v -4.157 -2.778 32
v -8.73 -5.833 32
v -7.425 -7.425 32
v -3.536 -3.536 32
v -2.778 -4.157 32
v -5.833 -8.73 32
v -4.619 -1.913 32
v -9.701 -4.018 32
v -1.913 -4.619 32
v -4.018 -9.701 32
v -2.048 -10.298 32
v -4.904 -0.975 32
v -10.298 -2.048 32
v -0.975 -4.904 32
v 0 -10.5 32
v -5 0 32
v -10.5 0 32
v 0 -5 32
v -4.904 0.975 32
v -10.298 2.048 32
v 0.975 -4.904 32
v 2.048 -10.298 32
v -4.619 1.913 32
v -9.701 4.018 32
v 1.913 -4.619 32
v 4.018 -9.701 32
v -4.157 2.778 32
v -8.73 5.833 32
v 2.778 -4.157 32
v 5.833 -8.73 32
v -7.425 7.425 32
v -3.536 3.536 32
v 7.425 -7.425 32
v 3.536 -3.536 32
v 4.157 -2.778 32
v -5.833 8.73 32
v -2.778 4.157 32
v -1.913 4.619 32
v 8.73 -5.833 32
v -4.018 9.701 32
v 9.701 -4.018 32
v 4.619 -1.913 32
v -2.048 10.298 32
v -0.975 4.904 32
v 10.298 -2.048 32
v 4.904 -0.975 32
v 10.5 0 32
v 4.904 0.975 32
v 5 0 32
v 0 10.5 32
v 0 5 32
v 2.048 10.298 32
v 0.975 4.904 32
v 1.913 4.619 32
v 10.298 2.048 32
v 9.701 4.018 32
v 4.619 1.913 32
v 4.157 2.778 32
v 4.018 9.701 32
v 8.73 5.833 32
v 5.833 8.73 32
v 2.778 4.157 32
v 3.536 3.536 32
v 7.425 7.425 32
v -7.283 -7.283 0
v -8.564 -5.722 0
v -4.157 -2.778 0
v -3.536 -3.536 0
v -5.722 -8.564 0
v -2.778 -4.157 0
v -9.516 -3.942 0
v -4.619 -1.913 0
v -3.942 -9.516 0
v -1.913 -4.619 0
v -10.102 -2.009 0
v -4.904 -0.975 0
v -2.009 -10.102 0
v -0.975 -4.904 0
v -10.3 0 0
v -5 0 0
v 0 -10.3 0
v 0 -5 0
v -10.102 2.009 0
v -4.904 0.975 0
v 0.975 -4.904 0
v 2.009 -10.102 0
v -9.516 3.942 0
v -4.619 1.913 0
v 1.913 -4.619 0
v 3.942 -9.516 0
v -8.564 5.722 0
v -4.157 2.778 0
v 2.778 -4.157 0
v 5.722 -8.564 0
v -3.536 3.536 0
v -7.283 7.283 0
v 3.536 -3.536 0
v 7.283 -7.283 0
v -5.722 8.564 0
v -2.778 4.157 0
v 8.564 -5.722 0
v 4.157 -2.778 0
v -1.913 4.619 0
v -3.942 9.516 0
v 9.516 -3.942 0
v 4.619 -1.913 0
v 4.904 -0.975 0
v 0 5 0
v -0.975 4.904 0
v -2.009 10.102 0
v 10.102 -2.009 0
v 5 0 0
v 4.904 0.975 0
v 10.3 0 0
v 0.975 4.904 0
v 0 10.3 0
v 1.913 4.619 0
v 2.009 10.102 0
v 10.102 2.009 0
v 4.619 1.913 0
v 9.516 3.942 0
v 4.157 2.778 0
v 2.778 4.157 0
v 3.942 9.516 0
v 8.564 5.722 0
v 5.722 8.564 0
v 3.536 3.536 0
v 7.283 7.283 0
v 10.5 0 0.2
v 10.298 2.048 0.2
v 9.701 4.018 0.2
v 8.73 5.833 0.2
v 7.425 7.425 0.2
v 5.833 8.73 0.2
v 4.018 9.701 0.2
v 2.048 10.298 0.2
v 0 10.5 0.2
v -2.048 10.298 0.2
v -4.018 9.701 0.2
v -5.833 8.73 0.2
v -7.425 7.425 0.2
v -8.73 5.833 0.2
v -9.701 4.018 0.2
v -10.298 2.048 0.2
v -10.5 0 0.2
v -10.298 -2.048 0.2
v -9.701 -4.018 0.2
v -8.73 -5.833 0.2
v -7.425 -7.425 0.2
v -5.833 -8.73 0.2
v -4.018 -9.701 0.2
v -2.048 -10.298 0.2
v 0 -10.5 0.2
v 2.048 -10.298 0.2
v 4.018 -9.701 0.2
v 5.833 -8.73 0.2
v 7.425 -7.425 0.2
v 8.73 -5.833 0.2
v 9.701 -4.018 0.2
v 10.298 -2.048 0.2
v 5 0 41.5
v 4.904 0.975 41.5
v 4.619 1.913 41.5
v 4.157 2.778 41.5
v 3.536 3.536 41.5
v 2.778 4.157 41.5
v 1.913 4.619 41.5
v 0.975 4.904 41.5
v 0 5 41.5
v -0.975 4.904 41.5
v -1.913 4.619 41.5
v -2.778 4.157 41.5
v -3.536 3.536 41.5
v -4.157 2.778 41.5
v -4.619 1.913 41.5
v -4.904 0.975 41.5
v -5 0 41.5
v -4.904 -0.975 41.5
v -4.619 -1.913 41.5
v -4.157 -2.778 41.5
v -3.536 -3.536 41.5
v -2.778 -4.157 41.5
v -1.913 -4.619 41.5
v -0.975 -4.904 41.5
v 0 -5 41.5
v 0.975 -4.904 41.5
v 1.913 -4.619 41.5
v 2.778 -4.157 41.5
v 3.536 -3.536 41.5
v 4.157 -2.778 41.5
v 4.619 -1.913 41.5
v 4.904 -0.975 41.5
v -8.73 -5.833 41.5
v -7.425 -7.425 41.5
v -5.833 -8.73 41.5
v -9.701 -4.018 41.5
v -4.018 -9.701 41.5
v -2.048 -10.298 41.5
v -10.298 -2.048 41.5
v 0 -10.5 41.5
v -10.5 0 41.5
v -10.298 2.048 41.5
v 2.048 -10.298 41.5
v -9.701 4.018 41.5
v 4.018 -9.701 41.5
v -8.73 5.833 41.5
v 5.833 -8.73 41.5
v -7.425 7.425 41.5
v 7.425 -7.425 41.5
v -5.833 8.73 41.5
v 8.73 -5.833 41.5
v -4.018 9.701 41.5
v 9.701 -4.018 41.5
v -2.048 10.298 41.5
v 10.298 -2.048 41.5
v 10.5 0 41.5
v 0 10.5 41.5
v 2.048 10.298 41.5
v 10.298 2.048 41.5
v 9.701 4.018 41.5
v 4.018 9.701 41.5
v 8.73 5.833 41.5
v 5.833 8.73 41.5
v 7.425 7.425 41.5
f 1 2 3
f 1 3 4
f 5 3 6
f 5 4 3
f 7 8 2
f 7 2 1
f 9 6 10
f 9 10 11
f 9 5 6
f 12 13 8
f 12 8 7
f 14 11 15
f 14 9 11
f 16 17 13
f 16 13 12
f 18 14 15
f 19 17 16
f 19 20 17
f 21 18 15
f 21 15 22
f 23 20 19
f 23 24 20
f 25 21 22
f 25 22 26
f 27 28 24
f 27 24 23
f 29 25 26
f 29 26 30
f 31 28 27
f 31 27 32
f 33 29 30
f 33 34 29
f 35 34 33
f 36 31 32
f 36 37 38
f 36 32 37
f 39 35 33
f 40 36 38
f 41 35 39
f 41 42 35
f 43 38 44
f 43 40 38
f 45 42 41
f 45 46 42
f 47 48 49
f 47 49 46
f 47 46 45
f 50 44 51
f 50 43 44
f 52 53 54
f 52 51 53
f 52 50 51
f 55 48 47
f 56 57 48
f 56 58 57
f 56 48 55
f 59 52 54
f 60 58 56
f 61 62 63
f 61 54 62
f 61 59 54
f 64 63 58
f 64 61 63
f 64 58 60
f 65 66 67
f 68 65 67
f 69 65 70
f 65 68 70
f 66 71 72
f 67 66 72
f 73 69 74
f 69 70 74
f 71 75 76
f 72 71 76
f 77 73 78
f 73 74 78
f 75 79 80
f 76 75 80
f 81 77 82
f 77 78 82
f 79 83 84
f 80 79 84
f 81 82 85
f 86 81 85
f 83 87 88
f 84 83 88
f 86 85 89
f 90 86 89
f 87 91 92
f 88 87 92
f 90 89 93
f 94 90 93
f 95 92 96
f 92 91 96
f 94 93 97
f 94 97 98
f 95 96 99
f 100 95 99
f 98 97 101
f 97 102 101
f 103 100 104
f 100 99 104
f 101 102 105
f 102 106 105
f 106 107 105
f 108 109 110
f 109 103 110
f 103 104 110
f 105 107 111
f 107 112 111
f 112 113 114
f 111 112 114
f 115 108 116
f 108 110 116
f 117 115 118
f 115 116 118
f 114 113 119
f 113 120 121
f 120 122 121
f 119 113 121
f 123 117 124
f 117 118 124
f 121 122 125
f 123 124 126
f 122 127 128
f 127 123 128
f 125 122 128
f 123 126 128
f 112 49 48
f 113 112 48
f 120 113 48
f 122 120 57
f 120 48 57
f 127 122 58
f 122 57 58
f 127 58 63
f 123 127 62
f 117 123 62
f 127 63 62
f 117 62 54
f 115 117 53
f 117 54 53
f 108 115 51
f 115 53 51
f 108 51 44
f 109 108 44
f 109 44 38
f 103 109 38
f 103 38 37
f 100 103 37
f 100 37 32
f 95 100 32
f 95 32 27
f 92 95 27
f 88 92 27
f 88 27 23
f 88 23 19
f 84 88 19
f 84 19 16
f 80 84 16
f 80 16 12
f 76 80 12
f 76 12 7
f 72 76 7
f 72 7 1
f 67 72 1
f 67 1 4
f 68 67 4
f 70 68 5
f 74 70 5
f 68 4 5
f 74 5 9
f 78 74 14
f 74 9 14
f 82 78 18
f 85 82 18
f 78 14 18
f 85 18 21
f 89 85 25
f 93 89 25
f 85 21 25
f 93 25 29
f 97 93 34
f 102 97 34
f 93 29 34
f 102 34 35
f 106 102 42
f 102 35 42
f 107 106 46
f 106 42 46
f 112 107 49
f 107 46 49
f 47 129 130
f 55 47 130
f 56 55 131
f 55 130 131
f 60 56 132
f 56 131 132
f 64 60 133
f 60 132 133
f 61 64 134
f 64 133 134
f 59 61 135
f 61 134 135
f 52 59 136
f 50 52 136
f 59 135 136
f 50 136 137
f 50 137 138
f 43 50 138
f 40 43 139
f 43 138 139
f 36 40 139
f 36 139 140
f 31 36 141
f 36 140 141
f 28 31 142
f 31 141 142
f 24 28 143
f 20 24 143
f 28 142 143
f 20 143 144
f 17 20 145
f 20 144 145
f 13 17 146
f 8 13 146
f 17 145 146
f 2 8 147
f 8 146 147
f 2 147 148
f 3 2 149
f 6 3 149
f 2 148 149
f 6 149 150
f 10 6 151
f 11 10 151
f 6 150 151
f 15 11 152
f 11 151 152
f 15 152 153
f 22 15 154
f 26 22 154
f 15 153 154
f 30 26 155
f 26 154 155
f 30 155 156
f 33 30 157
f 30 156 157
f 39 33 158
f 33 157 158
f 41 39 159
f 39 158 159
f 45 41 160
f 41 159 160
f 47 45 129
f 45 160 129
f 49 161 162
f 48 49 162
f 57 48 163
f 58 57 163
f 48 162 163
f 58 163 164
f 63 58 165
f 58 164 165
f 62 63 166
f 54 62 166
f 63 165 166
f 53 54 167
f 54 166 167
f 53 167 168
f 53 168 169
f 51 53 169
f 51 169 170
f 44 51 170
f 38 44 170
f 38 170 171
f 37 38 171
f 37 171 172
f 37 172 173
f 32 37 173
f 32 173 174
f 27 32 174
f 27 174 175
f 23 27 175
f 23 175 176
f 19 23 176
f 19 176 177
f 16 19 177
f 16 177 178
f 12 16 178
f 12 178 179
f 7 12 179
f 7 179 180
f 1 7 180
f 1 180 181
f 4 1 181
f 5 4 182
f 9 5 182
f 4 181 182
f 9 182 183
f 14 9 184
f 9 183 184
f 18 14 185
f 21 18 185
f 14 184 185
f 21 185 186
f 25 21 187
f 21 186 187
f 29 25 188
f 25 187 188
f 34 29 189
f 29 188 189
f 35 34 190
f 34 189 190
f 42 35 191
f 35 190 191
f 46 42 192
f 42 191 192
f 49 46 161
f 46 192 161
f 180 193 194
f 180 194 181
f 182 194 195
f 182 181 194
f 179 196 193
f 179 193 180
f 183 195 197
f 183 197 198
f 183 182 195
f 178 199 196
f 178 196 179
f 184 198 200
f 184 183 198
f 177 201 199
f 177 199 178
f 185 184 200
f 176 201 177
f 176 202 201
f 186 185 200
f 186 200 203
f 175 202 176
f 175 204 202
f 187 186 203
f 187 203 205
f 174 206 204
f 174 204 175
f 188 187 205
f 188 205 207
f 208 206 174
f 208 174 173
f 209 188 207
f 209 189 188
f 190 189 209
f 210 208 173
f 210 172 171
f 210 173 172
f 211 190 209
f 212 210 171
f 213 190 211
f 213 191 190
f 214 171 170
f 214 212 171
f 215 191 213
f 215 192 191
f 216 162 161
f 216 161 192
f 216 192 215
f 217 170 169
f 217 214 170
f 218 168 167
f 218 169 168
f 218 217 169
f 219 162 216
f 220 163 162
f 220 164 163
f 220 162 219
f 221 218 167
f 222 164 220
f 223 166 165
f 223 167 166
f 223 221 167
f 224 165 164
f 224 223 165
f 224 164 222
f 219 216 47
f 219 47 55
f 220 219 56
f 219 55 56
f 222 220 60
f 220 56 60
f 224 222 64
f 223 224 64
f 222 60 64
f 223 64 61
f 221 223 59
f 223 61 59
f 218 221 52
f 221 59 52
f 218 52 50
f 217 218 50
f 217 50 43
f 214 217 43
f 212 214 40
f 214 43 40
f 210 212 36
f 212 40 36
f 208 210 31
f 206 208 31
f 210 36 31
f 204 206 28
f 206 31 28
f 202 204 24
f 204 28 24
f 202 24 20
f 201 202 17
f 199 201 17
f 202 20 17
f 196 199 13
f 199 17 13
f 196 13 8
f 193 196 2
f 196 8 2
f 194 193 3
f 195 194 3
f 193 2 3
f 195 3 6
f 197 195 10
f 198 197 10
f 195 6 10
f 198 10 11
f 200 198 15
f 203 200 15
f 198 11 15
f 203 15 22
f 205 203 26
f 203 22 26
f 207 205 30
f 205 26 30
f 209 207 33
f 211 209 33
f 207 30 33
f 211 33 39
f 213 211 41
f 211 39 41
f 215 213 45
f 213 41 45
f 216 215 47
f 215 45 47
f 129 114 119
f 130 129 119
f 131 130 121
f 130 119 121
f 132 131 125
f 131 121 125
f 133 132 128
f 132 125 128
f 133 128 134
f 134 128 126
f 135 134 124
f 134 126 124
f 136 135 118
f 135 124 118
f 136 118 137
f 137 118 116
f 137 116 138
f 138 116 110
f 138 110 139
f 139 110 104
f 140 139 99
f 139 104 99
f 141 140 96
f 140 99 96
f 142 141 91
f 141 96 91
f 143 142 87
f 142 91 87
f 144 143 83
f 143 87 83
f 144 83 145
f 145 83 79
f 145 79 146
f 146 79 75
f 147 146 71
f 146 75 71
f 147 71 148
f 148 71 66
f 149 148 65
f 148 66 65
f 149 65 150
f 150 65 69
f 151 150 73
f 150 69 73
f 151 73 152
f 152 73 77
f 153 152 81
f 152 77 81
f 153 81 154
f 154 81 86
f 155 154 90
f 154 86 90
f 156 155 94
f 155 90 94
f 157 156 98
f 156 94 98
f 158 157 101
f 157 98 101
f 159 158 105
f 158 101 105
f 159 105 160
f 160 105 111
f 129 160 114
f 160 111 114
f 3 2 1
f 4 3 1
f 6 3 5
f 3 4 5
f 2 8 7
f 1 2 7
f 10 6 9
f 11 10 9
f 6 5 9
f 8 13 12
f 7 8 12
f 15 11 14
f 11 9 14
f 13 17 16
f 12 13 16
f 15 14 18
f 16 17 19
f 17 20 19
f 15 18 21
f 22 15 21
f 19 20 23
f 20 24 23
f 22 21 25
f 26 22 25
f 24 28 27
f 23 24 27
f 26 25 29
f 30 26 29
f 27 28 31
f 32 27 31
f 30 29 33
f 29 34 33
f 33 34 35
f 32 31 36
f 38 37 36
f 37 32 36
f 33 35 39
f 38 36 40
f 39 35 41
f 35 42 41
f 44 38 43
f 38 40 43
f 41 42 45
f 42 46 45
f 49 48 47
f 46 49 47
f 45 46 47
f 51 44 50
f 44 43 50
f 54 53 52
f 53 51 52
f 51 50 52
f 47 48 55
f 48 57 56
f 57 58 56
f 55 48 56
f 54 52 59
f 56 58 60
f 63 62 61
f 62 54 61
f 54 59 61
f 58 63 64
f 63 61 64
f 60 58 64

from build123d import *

# Parameters (mm, degrees)
SKETCH_1_R          = 10.5
EXTRUDE_1_DEPTH     = 32
SKETCH_2_R          = 10.5
EXTRUDE_2_DEPTH     = 9.5
SKETCH_3_R          = 5
CUT_EXTRUDE_3_DEPTH = 45.076637803
CHAMFER_1_SIZE      = 0.2


with BuildPart() as part:
    # 草图1 → 拉伸1 (new body)
    with BuildSketch(Plane.XY):
        Circle(SKETCH_1_R)
    extrude(amount=EXTRUDE_1_DEPTH)


with BuildPart() as body_2:
    # 草图2 → 拉伸2 (new body)
    with BuildSketch(Plane.XY.offset(32)):
        Circle(SKETCH_2_R)
    extrude(amount=EXTRUDE_2_DEPTH)


with BuildPart() as cut_extrude_3_tool:
    # 草图3 → 拉伸3 (new, through all)
    with BuildSketch(Plane.XY.offset(41.5)):
        Circle(SKETCH_3_R)
    extrude(amount=-CUT_EXTRUDE_3_DEPTH)


with BuildPart() as part_1:
    add(part.part)

    # 拉伸3: cut by cut_extrude_3_tool
    add(cut_extrude_3_tool.part, mode=Mode.SUBTRACT)

    # 倒角1
    chamfer_1_edges = [part_1.edges().sort_by_distance(p)[0] for p in [
        (-10.5, 0, 0),
    ]]
    chamfer(chamfer_1_edges, length=CHAMFER_1_SIZE)


with BuildPart() as body_2_1:
    add(body_2.part)

    # 拉伸3: cut by cut_extrude_3_tool
    add(cut_extrude_3_tool.part, mode=Mode.SUBTRACT)


solid = Compound([part_1.part, body_2_1.part])
